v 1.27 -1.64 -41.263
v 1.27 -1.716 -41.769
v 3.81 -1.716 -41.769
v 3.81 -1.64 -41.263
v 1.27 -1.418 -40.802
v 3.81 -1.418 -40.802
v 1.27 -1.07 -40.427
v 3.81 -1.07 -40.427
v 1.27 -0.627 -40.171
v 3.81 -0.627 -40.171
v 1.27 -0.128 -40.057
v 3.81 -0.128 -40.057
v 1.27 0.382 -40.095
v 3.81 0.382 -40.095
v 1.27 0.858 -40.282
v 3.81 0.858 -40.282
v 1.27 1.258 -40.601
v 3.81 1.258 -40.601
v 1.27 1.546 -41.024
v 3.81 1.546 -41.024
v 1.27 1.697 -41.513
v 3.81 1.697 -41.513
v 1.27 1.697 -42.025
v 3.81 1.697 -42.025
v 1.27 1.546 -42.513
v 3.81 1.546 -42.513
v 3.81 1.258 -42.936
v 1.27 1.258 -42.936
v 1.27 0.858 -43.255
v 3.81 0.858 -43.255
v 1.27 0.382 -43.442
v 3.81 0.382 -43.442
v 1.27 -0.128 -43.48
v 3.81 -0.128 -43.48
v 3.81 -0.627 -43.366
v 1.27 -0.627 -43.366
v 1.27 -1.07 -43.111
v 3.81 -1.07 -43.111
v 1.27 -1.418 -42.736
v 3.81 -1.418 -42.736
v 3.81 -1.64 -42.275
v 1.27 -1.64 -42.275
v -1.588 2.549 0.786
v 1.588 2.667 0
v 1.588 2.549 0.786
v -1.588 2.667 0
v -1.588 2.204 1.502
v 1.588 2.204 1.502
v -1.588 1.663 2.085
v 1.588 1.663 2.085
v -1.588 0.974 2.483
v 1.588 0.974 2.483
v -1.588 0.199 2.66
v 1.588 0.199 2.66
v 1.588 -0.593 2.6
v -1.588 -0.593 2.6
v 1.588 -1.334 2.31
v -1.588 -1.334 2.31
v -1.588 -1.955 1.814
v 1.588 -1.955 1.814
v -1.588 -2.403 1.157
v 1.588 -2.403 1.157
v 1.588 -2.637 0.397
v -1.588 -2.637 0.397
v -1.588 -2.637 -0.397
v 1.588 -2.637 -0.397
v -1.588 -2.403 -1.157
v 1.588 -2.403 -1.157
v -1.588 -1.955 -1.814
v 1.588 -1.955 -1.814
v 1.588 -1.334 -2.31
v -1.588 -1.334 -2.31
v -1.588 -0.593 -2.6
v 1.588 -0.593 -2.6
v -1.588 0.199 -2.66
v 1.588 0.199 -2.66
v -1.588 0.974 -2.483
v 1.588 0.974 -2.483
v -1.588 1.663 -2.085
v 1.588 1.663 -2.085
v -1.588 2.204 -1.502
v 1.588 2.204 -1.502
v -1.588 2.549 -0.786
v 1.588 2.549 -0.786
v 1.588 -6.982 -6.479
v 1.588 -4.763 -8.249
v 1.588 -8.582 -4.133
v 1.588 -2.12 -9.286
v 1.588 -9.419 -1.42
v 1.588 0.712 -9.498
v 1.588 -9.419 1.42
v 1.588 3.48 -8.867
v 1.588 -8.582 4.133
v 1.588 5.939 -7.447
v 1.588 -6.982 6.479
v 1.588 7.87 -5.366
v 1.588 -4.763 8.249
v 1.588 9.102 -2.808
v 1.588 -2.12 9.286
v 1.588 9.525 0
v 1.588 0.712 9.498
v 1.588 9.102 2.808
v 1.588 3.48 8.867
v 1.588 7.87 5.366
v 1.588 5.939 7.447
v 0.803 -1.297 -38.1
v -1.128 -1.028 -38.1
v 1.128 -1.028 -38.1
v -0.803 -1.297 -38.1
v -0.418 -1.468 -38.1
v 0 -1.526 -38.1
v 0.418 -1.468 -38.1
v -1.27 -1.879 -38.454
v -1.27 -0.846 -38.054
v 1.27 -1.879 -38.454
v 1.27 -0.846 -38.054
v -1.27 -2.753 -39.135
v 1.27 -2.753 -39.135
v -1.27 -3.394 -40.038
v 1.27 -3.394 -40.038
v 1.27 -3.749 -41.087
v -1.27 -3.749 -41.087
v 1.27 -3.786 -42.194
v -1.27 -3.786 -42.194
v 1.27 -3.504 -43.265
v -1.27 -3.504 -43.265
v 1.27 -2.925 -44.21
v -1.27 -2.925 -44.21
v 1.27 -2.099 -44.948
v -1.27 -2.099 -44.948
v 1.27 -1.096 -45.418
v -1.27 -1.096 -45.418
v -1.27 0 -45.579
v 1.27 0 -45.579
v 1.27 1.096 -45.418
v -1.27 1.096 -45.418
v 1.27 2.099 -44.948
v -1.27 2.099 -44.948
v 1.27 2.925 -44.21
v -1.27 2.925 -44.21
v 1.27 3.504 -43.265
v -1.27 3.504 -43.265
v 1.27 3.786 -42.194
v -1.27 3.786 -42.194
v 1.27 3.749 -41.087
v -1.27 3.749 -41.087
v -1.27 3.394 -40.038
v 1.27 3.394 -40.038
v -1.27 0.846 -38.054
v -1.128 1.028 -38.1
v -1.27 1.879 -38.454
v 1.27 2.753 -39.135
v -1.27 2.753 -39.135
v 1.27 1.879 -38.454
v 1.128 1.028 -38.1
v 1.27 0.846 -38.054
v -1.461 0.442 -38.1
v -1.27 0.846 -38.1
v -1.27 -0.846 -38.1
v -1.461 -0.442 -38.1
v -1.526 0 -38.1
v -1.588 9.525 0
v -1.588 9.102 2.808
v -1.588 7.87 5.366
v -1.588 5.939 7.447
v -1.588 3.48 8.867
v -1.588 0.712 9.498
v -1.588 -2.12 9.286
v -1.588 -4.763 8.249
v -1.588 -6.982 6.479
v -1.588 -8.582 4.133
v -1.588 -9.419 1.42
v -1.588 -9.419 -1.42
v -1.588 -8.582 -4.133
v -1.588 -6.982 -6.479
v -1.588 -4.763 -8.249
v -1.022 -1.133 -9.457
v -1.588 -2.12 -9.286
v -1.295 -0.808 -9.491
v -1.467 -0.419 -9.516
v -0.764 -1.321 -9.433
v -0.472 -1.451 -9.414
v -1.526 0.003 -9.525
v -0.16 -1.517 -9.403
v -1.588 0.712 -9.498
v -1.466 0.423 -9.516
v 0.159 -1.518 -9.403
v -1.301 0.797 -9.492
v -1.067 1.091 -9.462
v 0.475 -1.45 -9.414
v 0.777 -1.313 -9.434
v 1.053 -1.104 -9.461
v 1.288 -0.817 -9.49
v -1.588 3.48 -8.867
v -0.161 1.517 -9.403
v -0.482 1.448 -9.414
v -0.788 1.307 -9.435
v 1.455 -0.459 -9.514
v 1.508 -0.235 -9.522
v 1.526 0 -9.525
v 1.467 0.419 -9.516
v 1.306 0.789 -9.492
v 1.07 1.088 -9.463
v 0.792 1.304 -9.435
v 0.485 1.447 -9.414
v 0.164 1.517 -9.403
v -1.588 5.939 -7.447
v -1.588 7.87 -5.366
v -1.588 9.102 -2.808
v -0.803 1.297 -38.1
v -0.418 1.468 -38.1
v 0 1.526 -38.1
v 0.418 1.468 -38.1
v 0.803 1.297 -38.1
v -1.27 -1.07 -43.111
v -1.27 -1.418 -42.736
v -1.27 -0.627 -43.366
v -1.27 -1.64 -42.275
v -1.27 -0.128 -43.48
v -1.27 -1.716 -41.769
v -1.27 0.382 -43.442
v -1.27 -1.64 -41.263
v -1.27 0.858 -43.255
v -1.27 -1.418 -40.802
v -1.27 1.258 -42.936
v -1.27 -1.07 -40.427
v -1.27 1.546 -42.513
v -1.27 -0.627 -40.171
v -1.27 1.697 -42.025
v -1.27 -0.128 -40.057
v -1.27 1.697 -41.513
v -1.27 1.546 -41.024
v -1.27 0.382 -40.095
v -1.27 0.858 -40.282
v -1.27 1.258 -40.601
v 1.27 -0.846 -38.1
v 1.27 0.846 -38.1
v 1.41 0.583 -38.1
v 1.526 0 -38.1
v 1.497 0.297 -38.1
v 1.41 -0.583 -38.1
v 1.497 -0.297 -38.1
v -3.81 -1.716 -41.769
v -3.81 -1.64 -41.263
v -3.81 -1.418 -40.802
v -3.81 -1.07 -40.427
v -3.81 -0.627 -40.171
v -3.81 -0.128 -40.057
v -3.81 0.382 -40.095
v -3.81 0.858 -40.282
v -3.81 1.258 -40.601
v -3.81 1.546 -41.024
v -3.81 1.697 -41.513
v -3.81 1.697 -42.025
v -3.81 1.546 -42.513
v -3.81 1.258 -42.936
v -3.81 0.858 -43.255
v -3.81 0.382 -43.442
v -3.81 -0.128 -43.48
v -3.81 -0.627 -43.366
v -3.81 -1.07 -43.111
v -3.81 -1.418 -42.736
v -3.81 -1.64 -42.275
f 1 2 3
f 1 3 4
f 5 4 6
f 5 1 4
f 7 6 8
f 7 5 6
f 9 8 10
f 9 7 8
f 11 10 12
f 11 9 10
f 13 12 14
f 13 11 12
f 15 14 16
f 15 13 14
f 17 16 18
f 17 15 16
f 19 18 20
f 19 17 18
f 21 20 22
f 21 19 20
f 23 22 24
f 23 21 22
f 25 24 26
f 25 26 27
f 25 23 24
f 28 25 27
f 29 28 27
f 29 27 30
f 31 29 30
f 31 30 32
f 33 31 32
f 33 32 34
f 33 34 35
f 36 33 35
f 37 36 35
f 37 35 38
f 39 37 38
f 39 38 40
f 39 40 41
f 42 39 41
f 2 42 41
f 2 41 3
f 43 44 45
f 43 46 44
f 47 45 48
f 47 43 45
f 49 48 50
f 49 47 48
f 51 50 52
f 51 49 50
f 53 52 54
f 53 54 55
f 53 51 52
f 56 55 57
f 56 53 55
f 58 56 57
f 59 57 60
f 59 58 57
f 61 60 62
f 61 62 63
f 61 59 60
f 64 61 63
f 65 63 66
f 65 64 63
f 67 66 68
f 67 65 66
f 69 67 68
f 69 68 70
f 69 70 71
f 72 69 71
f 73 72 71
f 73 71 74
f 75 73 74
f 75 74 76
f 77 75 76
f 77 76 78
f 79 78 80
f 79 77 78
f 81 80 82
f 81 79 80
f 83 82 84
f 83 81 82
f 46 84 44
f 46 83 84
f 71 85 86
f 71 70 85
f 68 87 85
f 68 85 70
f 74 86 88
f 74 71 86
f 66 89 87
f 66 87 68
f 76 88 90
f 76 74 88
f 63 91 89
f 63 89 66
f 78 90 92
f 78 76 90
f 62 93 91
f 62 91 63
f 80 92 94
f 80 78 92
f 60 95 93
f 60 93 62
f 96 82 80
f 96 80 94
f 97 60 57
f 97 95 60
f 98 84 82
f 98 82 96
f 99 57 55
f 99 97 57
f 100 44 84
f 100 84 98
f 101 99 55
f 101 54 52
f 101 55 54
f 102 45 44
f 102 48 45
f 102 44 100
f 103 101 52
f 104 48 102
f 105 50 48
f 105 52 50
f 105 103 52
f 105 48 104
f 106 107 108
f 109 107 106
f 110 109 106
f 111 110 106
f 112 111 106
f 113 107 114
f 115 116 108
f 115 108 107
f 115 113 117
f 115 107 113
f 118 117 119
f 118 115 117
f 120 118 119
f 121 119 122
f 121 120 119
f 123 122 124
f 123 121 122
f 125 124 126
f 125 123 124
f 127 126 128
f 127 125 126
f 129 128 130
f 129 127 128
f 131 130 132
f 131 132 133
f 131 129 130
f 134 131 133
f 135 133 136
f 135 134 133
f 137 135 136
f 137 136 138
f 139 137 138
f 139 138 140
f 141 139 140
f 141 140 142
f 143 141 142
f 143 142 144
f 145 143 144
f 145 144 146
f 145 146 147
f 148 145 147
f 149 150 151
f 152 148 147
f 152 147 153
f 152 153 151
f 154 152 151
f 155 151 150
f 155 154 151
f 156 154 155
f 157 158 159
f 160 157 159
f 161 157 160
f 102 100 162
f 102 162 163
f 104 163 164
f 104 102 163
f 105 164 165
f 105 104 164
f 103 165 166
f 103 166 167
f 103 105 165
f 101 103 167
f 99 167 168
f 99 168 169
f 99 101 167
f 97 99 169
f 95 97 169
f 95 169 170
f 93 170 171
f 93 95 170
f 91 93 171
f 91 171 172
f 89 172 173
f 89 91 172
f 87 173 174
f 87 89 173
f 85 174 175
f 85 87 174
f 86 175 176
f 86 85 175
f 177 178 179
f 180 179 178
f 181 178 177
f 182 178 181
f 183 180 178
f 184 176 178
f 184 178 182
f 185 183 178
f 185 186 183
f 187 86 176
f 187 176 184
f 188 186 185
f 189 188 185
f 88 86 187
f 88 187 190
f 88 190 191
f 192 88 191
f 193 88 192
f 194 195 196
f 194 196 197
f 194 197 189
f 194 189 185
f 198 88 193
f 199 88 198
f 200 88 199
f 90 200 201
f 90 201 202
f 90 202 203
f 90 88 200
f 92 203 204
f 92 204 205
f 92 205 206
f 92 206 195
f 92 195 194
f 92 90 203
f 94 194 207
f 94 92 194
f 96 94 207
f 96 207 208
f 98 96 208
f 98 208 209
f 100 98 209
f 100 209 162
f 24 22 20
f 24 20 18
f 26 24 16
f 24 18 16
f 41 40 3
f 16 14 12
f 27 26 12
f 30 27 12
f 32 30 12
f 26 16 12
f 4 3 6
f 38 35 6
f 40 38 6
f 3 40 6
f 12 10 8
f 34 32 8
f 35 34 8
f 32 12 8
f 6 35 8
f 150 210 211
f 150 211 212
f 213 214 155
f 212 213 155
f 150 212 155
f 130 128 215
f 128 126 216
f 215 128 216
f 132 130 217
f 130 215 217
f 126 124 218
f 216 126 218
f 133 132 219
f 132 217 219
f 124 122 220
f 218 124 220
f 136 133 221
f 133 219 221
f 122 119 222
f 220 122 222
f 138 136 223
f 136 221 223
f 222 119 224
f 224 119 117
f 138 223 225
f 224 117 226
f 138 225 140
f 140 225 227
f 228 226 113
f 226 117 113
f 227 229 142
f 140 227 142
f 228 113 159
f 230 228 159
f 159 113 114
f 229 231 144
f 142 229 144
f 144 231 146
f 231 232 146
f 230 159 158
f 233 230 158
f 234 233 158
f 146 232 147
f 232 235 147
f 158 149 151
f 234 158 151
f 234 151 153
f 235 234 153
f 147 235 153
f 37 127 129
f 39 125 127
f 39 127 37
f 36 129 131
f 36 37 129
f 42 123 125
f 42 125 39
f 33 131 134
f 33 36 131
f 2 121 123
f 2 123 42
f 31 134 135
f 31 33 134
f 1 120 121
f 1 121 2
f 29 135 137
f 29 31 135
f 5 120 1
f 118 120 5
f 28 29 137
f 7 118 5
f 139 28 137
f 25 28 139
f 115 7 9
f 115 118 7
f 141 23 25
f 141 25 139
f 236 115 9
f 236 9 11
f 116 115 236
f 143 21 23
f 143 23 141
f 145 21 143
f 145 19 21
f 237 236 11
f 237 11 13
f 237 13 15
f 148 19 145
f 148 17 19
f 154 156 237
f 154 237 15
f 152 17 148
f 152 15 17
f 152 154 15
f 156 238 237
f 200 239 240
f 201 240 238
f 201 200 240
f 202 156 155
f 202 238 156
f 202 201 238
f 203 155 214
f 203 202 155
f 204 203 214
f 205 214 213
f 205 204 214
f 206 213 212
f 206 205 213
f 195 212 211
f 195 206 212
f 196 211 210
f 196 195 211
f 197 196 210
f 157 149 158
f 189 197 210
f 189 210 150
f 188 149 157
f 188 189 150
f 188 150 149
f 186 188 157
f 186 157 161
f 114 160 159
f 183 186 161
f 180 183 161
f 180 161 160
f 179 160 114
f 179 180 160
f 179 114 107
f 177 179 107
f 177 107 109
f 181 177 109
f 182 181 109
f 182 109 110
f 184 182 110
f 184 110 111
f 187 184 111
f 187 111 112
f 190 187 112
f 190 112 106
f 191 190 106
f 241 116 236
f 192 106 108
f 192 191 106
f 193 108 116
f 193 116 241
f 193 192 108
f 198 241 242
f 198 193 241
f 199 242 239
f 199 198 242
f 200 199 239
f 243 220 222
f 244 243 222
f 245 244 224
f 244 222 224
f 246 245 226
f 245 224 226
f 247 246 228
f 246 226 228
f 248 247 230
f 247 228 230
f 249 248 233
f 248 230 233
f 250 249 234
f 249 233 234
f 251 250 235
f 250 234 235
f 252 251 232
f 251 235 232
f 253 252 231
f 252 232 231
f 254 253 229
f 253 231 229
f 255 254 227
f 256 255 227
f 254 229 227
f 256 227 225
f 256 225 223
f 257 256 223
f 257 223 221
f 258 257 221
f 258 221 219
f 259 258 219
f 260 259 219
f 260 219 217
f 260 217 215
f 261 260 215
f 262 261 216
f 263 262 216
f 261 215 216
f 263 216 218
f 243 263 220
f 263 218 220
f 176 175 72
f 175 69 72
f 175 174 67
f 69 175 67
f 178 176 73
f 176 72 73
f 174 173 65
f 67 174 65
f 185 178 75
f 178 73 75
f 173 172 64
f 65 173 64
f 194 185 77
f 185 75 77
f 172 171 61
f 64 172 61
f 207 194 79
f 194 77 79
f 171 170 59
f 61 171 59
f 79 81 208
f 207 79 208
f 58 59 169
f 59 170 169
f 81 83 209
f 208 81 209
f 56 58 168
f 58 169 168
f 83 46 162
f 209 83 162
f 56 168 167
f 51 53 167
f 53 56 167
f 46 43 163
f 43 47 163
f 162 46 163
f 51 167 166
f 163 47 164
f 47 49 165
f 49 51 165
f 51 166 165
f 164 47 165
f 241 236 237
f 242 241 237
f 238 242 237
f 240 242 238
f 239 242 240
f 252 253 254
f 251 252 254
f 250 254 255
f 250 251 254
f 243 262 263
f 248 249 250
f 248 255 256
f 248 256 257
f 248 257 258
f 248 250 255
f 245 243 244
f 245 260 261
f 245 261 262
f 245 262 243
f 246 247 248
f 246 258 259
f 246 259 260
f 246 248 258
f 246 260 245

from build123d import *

# Parameters (mm, degrees)
F0_R          = 9.525
F0_R_2        = 2.667
F1_DEPTH      = 1.5875
F3_START      = -5.08
F2_R          = 1.5259148542
F3_DEPTH      = 33.02
F4_R          = 3.81
F5_DEPTH      = 1.27
F6_R          = 1.7164061496
F7_DEPTH      = 2.54
F7_DEPTH_BACK = 5.08


with BuildPart() as f1:
    # F0 (on Right) → F1 (new body, symmetric)
    with BuildSketch(Plane.YZ):
        Circle(F0_R)
        Circle(F0_R_2, mode=Mode.SUBTRACT)
    extrude(amount=F1_DEPTH, both=True)

    # F2 (on Top) → F3 (join)
    with BuildSketch(Plane.XY.offset(F3_START)):
        Circle(F2_R)
    extrude(amount=-F3_DEPTH)

    # F4 (on Right) → F5 (join, symmetric)
    with BuildSketch(Plane.YZ):
        with Locations((0, -41.7686875335)):
            Circle(F4_R)
    extrude(amount=F5_DEPTH, both=True)

    # F6 (on face) → F7 (join, two sides)
    with BuildSketch(Plane(origin=(-1.27, 0, 0), x_dir=(0, -1, 0), z_dir=(-1, 0, 0))) as f7_sk:
        with Locations((0, -41.7686875335)):
            Circle(F6_R)
    extrude(amount=F7_DEPTH)
    extrude(f7_sk.sketch, amount=-F7_DEPTH_BACK)


solid = f1.part
